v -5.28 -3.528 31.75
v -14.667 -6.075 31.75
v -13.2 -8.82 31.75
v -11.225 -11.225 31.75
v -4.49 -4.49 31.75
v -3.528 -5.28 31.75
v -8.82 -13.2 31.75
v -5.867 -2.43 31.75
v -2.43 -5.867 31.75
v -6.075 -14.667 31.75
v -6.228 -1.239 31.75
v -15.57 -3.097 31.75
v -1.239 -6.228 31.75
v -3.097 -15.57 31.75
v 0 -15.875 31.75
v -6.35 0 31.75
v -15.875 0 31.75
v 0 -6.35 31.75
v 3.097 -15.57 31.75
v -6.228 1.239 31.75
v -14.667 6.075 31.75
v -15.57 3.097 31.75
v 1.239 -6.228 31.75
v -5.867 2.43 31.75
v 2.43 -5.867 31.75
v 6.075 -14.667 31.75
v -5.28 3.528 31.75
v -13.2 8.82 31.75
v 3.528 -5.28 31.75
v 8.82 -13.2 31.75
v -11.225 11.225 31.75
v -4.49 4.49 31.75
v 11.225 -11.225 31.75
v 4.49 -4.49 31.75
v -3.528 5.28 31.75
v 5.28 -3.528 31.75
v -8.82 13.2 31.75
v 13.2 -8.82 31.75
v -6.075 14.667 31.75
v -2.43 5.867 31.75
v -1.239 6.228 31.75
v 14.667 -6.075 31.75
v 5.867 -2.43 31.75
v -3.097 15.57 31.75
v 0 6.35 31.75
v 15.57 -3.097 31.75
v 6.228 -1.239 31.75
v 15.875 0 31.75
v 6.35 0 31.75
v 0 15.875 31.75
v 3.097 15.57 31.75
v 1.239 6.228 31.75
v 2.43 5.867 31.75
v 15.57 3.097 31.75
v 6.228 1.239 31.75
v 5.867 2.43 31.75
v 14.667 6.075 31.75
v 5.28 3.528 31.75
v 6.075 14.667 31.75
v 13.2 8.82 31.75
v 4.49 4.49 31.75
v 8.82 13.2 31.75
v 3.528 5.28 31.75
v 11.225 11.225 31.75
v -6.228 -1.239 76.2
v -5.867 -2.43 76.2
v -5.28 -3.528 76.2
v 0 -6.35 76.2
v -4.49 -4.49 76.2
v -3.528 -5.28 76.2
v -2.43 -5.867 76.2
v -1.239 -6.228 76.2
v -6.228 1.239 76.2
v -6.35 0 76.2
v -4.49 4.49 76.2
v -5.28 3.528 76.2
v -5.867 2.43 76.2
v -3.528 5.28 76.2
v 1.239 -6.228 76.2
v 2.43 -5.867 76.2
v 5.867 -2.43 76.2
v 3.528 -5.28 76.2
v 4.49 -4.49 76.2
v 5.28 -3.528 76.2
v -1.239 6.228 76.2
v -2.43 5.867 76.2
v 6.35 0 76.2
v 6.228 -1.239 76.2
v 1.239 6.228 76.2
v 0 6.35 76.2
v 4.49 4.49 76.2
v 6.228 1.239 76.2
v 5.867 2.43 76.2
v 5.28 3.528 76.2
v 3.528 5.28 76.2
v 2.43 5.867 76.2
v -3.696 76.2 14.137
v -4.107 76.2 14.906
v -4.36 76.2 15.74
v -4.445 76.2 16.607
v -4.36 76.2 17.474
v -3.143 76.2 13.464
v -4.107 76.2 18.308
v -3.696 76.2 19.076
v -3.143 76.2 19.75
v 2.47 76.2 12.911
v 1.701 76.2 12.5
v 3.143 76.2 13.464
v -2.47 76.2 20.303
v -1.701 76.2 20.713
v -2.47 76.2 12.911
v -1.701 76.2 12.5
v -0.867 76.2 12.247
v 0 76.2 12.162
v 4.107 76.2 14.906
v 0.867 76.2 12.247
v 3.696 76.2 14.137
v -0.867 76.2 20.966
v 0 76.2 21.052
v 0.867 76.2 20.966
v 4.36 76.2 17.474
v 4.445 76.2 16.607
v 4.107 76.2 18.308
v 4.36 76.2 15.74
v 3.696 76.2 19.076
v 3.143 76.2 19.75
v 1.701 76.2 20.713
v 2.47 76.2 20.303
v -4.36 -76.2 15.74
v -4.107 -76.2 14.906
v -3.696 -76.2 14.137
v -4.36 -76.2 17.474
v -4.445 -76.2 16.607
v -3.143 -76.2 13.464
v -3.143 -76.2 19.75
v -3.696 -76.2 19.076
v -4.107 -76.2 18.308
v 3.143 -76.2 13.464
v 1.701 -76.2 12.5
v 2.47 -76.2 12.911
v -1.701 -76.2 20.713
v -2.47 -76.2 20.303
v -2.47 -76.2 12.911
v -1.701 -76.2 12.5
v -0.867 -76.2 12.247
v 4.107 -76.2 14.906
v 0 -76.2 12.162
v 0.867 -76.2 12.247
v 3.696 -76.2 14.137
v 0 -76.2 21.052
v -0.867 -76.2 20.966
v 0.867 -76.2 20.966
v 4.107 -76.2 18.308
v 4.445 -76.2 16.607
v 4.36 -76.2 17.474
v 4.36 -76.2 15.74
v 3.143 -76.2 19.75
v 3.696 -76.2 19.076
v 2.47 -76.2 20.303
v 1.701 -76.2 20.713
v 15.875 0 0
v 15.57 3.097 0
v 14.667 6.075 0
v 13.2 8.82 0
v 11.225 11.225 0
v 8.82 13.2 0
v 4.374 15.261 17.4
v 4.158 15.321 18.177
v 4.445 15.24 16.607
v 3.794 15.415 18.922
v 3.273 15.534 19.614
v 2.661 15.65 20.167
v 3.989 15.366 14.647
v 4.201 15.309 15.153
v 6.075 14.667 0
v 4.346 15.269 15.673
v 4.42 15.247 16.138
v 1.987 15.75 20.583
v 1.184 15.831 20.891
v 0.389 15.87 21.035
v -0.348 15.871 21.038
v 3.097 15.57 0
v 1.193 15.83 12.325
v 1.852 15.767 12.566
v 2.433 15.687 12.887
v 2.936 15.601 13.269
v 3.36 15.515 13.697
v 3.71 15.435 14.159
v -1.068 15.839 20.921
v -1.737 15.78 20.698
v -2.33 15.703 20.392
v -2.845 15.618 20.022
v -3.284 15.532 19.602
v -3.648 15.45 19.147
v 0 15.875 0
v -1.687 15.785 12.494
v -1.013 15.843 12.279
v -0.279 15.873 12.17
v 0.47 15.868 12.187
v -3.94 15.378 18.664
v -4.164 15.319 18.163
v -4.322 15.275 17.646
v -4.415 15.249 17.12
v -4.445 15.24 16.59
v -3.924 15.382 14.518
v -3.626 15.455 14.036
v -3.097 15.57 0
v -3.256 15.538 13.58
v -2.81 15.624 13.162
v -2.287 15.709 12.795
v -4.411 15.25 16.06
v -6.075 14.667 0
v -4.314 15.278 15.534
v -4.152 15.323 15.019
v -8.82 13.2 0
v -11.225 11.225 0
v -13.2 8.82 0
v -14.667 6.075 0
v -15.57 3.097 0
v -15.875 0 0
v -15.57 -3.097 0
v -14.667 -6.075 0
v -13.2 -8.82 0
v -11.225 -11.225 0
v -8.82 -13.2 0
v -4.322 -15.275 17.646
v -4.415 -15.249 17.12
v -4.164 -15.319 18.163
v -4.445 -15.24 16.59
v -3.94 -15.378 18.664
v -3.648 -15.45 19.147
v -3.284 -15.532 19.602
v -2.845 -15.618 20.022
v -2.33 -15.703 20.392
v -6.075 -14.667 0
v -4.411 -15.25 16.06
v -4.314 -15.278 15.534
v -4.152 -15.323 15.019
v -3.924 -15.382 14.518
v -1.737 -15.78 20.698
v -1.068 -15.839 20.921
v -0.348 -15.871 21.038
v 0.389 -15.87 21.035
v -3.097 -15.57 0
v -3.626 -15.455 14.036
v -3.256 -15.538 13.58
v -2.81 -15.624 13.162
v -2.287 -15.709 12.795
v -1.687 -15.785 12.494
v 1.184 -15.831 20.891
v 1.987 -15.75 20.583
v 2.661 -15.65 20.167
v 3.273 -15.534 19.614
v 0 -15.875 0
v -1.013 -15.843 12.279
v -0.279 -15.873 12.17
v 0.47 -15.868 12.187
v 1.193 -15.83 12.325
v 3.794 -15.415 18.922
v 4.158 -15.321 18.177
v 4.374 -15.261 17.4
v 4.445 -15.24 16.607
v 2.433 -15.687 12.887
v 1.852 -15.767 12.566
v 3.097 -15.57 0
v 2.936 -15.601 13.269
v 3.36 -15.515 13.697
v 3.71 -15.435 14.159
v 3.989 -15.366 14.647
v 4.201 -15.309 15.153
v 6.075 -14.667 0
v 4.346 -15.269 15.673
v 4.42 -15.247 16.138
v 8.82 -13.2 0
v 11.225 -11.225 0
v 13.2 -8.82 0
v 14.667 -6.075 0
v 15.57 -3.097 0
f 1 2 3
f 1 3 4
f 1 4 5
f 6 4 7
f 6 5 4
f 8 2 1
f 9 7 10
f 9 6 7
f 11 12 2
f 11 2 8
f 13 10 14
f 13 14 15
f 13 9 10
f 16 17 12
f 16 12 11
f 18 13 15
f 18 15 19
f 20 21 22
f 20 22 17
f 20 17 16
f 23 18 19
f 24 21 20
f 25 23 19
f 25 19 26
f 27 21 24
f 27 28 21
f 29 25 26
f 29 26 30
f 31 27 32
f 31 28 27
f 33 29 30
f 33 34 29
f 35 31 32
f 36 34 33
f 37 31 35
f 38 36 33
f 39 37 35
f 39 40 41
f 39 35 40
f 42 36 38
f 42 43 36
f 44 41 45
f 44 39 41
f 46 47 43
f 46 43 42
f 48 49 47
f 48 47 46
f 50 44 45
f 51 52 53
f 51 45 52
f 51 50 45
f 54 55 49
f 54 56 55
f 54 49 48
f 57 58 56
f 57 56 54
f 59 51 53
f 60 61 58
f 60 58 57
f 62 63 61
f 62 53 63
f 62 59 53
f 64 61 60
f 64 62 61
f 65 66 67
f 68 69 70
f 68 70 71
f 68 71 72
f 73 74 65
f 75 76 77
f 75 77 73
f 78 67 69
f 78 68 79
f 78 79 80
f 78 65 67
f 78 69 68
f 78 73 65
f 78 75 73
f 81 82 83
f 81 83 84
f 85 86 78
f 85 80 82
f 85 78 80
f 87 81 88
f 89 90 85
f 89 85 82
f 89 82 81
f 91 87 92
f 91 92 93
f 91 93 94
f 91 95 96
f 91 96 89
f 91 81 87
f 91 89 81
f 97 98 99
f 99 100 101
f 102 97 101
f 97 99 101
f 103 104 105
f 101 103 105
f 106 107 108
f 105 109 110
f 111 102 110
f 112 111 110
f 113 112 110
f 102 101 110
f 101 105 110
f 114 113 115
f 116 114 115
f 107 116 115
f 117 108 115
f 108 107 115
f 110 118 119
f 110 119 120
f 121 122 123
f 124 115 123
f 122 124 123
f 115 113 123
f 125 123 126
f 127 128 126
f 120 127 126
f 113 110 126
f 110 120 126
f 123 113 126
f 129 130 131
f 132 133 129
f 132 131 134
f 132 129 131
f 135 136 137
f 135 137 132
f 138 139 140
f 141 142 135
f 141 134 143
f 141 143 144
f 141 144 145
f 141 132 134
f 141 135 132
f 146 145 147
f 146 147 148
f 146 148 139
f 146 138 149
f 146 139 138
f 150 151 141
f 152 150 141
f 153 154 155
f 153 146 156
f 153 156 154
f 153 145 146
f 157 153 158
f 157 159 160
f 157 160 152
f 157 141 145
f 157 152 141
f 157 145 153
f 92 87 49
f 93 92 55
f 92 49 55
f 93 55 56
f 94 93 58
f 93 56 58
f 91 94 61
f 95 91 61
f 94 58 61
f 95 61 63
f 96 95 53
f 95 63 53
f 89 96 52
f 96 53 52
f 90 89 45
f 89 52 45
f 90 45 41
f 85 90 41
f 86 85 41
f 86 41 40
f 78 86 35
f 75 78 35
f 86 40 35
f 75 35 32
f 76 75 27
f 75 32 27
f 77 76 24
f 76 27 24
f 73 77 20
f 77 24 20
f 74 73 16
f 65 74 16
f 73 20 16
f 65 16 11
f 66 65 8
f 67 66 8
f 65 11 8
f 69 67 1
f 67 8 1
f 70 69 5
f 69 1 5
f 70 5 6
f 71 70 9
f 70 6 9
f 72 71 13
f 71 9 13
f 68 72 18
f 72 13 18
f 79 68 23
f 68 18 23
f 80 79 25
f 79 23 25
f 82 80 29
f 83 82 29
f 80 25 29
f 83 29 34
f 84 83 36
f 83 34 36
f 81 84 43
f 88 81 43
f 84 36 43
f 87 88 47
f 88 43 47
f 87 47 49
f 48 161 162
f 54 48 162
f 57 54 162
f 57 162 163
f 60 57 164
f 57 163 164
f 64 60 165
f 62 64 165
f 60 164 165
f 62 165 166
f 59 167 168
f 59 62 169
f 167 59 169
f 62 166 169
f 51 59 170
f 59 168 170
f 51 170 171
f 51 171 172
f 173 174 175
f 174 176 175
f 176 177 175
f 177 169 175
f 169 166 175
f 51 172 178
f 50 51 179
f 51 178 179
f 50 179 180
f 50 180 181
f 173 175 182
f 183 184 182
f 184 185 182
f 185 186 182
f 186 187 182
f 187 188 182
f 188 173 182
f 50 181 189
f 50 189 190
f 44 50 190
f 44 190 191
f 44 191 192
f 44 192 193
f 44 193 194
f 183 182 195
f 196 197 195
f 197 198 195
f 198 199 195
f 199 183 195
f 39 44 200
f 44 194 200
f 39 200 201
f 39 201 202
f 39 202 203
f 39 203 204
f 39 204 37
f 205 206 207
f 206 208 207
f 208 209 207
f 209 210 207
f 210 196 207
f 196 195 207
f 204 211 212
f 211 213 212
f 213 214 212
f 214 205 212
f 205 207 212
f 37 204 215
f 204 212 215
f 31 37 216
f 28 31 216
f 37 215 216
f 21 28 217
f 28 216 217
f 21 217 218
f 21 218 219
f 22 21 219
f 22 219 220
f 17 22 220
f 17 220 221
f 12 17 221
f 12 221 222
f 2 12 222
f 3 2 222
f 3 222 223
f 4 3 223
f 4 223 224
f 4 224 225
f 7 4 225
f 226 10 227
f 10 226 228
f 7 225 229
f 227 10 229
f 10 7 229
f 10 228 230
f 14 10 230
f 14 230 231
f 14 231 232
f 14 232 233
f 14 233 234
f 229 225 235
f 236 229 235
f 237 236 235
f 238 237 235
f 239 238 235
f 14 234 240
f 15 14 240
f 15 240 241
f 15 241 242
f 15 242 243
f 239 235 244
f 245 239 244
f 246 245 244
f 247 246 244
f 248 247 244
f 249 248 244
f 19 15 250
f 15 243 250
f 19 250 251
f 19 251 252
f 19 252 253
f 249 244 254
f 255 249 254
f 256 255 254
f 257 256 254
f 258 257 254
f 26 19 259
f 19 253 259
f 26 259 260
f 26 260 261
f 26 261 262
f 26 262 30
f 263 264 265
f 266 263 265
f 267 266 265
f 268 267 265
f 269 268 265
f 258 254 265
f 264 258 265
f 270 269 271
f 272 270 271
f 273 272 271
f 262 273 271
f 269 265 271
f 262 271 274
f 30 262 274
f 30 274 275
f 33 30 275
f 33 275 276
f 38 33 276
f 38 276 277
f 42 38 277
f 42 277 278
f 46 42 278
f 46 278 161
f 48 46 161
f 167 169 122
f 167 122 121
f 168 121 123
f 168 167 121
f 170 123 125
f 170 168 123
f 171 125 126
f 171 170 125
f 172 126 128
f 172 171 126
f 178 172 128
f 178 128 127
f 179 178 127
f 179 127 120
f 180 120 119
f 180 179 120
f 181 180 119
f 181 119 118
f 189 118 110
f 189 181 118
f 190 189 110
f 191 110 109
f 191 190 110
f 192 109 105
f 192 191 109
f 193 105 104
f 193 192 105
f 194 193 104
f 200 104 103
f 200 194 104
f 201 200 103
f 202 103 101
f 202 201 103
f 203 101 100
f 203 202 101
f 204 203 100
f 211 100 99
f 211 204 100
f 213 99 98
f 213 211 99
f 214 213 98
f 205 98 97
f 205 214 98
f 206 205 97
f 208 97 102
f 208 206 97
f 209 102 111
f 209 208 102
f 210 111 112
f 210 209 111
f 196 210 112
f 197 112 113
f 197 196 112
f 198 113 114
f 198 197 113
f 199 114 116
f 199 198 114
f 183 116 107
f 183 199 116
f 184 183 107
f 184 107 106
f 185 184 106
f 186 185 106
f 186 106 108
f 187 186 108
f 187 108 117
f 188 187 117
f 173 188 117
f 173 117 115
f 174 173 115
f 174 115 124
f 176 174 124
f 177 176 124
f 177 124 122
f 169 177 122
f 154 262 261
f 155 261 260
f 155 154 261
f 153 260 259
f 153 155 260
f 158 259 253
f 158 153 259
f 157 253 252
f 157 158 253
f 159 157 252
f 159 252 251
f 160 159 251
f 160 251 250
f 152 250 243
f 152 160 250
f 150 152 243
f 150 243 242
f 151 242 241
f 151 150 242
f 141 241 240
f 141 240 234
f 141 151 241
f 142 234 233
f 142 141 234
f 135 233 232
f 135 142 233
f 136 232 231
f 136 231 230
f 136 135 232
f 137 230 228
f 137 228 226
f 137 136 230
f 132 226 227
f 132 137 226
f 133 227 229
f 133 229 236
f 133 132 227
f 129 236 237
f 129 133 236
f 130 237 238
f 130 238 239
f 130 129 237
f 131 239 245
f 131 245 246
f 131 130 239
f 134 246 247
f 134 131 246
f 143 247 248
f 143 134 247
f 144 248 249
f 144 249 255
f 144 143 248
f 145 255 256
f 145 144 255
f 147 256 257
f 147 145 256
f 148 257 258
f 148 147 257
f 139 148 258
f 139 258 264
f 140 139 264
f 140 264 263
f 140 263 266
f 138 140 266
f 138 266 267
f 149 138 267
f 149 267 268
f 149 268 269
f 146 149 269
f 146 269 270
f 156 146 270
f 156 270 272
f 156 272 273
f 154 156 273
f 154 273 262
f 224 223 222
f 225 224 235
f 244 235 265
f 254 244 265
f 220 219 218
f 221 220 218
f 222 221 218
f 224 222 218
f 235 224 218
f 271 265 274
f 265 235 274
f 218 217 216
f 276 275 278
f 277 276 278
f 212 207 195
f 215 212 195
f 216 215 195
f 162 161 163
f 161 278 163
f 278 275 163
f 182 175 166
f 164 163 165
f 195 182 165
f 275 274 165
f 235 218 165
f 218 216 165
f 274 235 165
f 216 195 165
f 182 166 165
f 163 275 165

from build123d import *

# Parameters (mm, degrees)
F0_R     = 15.875
F1_DEPTH = 31.75
F2_R     = 6.35
F3_DEPTH = 44.45
F4_R     = 4.445
F5_DEPTH = 76.2


with BuildPart() as f1:
    # F0 (on Top) → F1 (new body)
    with BuildSketch(Plane.XY):
        Circle(F0_R)
    extrude(amount=F1_DEPTH)

    # F2 (on face) → F3 (join)
    with BuildSketch(Plane.XY.offset(31.75)):
        Circle(F2_R)
    extrude(amount=F3_DEPTH)

    # F4 (on Front) → F5 (join, symmetric)
    with BuildSketch(Plane.XZ):
        with Locations((0, 16.606679)):
            Circle(F4_R)
    extrude(amount=F5_DEPTH, both=True)


solid = f1.part
